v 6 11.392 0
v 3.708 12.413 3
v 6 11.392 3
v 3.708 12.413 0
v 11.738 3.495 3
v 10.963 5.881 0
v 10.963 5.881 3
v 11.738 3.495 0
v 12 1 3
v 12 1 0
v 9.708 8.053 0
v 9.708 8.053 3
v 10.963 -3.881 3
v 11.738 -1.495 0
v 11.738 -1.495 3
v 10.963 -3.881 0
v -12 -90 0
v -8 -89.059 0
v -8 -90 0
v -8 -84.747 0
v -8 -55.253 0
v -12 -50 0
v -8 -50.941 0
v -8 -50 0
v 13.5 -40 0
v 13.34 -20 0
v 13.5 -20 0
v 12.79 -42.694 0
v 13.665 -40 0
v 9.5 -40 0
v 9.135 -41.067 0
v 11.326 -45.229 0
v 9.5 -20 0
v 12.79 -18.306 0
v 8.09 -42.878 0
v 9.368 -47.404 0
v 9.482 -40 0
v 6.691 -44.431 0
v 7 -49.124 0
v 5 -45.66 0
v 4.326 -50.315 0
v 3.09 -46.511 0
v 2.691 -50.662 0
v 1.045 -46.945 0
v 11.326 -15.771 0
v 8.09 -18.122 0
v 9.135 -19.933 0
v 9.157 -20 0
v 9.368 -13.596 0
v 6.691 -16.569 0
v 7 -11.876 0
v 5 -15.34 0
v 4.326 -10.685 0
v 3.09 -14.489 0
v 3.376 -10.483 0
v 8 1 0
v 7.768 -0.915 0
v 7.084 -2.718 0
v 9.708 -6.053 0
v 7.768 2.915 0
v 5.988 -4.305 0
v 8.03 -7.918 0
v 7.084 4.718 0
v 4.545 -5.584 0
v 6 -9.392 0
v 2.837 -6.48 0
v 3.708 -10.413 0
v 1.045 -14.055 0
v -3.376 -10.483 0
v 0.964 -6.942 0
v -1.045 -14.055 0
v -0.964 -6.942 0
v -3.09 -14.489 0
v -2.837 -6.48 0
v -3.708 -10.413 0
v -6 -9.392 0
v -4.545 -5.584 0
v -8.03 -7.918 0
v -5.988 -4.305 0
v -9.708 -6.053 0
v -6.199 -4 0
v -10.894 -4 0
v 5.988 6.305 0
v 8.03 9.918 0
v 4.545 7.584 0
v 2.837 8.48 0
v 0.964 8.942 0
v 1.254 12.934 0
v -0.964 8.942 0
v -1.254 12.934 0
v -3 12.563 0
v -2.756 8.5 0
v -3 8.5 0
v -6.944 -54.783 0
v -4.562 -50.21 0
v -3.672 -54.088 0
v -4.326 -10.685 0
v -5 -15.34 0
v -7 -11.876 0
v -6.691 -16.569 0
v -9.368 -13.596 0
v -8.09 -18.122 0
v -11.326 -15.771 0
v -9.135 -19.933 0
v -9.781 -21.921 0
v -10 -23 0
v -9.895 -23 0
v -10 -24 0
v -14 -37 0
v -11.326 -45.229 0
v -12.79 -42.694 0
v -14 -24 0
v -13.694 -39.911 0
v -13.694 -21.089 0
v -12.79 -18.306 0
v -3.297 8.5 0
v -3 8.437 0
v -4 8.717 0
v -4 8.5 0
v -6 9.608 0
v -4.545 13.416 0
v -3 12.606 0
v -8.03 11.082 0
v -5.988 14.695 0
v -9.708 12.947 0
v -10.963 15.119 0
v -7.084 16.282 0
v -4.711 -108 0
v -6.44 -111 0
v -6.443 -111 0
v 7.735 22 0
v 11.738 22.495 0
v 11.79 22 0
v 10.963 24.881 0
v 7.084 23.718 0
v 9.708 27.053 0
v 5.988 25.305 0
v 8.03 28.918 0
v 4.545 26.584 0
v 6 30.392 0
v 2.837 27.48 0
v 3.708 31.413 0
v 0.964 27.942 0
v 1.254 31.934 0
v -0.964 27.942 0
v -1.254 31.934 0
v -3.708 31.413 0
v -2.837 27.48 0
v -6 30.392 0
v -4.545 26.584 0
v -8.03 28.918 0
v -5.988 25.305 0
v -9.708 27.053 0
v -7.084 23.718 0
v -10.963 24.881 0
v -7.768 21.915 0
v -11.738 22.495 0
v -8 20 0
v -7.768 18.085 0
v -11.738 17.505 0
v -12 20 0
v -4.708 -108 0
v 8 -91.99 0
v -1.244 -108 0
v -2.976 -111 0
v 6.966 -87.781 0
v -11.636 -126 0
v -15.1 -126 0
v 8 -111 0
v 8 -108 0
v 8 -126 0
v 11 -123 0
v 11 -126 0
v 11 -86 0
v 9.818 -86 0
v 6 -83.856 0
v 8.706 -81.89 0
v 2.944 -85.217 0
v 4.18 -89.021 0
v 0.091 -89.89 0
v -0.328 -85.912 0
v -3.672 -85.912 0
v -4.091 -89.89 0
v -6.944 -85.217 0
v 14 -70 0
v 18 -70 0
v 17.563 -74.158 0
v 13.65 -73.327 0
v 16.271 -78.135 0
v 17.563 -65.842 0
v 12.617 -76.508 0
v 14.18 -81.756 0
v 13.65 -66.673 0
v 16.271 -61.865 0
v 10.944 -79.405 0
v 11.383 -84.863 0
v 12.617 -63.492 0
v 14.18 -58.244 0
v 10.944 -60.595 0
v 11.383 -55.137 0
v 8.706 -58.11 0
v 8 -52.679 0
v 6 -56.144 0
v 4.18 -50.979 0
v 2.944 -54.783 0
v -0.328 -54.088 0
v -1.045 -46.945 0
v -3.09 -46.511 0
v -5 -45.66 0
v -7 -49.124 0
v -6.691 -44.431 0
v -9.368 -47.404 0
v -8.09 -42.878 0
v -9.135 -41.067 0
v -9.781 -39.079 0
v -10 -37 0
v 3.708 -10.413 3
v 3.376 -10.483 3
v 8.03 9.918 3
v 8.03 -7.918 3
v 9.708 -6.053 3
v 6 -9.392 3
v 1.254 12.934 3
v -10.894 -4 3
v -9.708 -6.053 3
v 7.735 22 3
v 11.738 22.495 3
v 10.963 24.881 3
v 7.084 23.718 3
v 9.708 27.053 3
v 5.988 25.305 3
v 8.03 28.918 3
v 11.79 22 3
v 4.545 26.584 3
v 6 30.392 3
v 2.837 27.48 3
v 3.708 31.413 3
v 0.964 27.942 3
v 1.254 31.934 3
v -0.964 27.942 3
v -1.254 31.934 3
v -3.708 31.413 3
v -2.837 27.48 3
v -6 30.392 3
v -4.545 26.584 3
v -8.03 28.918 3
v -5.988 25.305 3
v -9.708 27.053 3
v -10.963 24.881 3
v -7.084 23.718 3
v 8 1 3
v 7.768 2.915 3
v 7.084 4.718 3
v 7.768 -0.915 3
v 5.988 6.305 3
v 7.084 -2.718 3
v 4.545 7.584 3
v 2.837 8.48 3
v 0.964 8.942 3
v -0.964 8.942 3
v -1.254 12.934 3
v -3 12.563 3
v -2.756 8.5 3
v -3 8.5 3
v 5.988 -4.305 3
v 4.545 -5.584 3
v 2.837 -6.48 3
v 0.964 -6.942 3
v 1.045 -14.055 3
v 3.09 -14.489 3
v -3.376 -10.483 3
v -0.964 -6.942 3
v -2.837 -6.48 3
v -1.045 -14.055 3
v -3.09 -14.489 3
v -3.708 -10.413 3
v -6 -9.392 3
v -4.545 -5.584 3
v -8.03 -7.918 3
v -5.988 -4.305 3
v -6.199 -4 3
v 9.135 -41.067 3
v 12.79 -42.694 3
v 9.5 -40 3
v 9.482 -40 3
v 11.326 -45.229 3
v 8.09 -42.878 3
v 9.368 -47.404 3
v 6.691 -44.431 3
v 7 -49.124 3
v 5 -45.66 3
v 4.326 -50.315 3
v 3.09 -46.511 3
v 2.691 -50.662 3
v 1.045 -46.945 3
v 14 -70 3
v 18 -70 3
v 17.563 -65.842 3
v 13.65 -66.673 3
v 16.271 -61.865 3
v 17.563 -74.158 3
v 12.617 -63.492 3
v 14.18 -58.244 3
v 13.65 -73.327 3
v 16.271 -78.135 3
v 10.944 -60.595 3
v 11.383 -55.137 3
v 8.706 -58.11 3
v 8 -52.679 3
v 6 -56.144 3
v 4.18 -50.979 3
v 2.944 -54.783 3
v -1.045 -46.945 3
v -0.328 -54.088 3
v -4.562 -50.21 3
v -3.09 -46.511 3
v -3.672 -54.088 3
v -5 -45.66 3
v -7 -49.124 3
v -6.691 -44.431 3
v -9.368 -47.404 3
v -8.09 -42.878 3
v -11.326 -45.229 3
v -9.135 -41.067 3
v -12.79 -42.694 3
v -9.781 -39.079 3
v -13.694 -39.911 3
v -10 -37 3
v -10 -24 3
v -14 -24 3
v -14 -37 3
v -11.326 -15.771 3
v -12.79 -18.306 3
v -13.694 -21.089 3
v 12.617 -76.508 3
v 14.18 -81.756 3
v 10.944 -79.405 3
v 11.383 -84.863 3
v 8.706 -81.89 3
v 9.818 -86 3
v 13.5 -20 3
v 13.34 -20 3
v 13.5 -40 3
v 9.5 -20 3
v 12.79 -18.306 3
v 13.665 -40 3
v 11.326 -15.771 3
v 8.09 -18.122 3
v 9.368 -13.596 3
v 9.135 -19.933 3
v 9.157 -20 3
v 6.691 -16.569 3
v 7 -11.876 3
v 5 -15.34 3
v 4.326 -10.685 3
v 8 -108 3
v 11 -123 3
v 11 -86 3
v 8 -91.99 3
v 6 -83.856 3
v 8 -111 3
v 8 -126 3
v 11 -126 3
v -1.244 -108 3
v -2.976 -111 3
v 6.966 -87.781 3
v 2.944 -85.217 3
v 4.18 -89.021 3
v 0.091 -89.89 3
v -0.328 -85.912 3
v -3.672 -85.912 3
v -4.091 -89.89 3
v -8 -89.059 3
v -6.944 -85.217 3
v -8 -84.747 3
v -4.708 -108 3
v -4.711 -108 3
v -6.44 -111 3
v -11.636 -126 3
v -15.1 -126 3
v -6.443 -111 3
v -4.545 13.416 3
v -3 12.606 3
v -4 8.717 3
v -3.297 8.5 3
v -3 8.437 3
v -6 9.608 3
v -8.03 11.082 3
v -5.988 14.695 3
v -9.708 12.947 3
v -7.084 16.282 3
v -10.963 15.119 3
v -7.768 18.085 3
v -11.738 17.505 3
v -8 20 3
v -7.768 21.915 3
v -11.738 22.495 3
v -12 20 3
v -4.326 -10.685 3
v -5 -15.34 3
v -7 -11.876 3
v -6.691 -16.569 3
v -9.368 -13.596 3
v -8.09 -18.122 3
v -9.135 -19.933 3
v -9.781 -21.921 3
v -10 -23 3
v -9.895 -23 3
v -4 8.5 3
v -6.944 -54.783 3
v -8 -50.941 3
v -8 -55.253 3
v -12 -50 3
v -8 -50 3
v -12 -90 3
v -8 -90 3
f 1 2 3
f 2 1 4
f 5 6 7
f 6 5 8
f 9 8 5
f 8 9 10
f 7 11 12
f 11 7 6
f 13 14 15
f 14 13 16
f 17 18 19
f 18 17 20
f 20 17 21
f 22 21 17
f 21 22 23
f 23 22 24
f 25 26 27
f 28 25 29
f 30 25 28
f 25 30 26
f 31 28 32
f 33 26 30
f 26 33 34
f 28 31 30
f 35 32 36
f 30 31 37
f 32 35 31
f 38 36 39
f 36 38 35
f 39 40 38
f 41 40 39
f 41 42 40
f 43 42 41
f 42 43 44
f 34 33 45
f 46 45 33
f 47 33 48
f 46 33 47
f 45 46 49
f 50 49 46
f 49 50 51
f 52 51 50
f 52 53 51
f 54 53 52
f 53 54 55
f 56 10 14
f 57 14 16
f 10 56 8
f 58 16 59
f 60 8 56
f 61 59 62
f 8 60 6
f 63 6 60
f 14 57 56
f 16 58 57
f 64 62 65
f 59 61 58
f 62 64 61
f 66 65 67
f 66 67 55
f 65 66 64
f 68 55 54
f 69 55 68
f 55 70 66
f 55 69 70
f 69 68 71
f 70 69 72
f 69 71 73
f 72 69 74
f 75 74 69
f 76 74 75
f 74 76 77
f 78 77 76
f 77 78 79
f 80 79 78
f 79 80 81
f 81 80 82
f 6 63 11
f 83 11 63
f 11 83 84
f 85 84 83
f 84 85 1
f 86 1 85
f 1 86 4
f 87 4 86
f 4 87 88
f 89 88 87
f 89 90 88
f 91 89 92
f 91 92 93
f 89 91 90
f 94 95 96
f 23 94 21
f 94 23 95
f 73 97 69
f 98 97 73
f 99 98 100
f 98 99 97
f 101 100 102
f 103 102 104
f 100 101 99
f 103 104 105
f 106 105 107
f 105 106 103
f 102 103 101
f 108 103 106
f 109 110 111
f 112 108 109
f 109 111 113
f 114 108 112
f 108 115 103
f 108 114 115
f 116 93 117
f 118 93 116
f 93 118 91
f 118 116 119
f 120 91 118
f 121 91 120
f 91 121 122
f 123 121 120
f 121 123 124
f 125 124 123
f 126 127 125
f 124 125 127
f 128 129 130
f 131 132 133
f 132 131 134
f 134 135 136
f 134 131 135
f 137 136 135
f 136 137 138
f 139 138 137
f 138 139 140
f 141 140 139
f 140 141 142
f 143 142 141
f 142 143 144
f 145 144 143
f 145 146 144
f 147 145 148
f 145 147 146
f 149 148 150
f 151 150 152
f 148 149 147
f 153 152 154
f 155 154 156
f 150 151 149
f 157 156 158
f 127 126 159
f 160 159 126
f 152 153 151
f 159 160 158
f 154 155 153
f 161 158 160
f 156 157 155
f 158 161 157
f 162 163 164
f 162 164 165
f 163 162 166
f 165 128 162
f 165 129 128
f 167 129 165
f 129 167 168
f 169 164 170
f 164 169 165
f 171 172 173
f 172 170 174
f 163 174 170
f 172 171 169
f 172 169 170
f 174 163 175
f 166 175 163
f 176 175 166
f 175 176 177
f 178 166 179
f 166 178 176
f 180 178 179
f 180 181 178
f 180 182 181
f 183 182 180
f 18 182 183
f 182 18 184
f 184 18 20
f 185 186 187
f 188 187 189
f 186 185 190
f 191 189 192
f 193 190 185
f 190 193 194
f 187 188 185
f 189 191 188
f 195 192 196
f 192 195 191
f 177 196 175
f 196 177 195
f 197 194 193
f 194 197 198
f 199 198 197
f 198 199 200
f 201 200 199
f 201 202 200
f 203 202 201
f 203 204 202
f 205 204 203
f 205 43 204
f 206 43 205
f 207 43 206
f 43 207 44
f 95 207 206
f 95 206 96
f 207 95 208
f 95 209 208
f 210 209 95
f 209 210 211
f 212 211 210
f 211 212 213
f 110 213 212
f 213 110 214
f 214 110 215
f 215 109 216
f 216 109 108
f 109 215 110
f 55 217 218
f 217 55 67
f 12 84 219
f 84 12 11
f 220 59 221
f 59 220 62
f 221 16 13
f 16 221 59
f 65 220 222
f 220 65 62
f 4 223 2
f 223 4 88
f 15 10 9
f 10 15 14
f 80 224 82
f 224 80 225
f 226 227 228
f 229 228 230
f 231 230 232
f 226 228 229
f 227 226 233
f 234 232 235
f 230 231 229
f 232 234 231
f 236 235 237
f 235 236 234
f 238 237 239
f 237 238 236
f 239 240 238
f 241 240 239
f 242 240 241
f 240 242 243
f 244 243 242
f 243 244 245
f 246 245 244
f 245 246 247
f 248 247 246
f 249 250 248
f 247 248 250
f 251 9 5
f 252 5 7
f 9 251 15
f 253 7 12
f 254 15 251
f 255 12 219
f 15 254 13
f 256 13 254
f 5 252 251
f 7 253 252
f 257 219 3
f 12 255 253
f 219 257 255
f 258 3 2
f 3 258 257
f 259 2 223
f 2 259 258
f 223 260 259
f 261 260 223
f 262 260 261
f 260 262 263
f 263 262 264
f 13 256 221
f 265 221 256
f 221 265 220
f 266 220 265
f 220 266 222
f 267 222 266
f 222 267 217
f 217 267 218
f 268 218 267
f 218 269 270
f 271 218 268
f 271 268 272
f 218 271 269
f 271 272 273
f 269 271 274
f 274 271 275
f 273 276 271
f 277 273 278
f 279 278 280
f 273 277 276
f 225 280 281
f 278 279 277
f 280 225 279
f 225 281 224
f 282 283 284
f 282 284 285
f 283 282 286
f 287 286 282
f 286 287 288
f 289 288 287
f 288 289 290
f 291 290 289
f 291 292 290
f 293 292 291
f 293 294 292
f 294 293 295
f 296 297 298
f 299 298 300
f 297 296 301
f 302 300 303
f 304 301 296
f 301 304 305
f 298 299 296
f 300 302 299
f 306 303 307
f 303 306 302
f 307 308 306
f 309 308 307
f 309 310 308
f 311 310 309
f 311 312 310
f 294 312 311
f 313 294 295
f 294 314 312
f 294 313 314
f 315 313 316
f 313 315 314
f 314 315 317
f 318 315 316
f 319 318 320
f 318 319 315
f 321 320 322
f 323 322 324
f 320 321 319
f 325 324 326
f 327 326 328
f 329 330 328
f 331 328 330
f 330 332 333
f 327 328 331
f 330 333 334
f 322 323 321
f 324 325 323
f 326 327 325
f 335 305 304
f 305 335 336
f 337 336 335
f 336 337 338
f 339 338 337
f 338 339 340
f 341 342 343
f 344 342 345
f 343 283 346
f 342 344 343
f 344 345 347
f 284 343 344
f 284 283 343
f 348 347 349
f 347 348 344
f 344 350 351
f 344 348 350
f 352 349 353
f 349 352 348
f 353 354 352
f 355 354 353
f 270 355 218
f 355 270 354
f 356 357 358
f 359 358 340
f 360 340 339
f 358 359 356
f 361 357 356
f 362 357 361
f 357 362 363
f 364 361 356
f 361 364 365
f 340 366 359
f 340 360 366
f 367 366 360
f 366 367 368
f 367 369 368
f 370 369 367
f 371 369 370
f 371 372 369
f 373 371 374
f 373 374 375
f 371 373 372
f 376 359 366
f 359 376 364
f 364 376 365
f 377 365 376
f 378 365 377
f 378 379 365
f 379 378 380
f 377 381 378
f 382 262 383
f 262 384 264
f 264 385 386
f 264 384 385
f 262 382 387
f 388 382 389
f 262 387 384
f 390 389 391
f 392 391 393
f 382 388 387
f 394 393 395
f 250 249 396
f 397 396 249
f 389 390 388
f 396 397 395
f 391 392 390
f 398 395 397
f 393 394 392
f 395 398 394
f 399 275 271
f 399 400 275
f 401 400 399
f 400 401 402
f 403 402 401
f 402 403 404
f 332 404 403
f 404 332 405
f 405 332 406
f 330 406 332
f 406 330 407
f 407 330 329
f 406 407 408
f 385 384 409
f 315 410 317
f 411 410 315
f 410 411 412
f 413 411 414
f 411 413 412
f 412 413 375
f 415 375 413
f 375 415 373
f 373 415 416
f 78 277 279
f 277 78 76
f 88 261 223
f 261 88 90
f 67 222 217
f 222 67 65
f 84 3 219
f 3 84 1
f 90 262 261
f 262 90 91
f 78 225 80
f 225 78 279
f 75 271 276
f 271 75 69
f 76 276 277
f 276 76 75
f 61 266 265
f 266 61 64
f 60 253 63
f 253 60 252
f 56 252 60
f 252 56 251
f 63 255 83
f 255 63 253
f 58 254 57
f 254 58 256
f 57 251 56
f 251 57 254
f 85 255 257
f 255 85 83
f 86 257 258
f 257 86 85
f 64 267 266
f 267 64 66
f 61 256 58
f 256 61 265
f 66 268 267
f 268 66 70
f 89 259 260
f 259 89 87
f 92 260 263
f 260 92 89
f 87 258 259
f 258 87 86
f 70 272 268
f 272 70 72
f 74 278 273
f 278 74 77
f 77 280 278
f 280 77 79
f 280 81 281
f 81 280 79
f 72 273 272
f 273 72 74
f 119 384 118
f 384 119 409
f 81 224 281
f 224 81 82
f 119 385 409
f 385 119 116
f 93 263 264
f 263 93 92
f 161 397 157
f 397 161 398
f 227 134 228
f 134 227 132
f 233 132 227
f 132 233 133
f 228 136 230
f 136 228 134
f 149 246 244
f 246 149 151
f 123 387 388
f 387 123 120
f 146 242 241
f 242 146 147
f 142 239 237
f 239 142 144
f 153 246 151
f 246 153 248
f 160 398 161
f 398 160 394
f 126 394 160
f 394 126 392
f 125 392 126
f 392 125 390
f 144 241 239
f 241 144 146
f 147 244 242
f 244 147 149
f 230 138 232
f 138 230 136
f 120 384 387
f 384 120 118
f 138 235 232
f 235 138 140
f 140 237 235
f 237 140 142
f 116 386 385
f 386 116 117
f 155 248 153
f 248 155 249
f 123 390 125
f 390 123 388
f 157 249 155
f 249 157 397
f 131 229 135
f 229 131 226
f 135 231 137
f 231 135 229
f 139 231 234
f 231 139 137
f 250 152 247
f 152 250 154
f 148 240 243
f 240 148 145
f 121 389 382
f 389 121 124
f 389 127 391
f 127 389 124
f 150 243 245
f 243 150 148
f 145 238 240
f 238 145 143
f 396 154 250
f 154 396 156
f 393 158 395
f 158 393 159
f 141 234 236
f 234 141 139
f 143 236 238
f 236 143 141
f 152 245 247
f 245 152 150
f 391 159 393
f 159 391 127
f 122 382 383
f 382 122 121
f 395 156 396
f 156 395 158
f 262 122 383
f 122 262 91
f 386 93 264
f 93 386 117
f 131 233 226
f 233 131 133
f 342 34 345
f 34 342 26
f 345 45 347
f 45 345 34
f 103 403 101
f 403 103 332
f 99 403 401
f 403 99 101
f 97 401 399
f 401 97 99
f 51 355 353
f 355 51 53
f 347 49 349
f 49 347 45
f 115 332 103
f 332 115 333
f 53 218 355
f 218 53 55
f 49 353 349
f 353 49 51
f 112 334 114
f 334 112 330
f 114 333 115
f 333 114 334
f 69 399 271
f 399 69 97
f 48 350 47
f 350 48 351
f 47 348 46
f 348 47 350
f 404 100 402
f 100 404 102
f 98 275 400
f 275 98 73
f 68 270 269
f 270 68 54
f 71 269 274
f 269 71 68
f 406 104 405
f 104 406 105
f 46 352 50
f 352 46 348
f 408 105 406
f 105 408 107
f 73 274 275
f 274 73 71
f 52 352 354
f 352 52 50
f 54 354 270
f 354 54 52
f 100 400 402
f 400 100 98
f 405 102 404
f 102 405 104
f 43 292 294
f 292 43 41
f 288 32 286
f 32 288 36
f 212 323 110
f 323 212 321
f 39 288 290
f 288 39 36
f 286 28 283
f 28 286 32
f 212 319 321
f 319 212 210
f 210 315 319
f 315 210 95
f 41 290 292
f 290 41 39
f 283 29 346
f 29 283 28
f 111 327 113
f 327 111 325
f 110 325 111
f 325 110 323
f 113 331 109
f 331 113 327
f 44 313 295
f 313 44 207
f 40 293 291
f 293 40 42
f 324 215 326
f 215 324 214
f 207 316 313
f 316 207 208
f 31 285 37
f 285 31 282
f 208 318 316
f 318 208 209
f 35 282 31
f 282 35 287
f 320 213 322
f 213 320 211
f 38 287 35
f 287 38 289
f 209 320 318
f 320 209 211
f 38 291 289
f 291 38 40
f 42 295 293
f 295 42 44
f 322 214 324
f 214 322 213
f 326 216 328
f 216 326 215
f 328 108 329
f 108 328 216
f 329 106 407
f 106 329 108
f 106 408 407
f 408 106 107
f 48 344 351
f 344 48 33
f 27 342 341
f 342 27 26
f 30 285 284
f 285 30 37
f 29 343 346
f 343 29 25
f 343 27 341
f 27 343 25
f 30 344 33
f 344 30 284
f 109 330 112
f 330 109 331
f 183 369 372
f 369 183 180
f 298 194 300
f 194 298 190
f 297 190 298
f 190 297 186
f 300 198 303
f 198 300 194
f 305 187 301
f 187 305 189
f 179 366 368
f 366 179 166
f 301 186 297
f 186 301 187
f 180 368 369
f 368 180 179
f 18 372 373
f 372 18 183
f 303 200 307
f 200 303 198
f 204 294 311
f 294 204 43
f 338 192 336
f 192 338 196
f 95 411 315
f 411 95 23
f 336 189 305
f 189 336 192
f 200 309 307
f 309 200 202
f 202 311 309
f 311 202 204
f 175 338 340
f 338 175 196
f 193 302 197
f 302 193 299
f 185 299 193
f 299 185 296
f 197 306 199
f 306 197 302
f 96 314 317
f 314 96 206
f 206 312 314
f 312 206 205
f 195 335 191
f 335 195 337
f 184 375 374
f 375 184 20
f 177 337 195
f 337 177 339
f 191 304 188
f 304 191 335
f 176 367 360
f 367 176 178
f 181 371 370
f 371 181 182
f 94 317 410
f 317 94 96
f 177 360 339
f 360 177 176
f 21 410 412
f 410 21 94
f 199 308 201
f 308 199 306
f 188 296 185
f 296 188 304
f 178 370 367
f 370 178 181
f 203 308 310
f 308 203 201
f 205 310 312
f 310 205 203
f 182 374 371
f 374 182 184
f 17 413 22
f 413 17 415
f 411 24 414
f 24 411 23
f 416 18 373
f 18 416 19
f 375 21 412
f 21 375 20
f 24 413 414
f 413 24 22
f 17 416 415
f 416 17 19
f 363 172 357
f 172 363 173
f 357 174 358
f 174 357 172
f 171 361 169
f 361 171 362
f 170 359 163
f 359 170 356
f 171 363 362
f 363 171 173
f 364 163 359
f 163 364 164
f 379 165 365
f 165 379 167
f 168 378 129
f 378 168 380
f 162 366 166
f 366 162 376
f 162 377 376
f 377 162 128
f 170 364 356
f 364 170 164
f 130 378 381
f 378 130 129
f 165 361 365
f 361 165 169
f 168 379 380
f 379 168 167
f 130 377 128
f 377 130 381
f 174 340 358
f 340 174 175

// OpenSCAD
//S

difference(){
 translate([0,1,0]) cylinder(3,12,12);
 translate([0,1,-1]) cylinder(5,8,8);
 translate([-14,-4,-1]) cube([10,15,5]);
 translate([-14,-1.5,-1]) cube([12,10,5]);
}

 difference(){

 translate([0,20,0]) cylinder(3,12,12);
 translate([0,20,-1]) cylinder(5,8,8);
 translate([-3,7,-1]) cube([20,15,5]);
}


// буква О
translate([-40,-50,0])
union(){
  translate([49.5,10,0]) cube([4,20,3]);
  translate([26,13,0]) cube([4,13,3]);
difference(){
union(){
	
  difference(){
  translate([40,26,0]) cylinder(3,14,14);
  translate([40,26,-1]) cylinder(5,10,10);
  translate([33,10,-1]) cube([20,10,5]);

}

difference(){
  translate([40,13,0]) cylinder(3,14,14);
  translate([40,13,-1]) cylinder(5,10,10);
  translate([32,17,-1]) cube([19,10,5]);
  translate([40,17,-1]) cube(20);
}
}
  translate([30,13,-1]) cube([5,14,5]);
  translate([42,10,-1]) cube(20);
}
}

//D
translate([-7,-90,0]) 
union(){
   translate([-5,0,0]) cube([4,40,3]);
 difference(){
    translate([5,20,0]) cylinder(3,20,20);
     translate([5,20,-1]) cylinder(6,16,16);
      translate([-15,0,-1]) cube([10,40,6]);
}
}
 
//A
translate([8,-126,0])
 union(){
    difference(){
   union(){
    cube([3,40,3]);
   translate([-23.1,0,0]) rotate([0,0,-30])  cube([3,50,3]);
   translate([-15,15,0]) cube([20,3,3]);
}
   translate([-40,-8,-1]) cube([30,8,5]);
   translate([3,3,-1]) cube([10,40,5]);
  translate([-34.65,0,-1]) rotate([0,0,-30]) cube([10,40,5]);
  translate([0,40,-1]) cube(10);
}
}  
